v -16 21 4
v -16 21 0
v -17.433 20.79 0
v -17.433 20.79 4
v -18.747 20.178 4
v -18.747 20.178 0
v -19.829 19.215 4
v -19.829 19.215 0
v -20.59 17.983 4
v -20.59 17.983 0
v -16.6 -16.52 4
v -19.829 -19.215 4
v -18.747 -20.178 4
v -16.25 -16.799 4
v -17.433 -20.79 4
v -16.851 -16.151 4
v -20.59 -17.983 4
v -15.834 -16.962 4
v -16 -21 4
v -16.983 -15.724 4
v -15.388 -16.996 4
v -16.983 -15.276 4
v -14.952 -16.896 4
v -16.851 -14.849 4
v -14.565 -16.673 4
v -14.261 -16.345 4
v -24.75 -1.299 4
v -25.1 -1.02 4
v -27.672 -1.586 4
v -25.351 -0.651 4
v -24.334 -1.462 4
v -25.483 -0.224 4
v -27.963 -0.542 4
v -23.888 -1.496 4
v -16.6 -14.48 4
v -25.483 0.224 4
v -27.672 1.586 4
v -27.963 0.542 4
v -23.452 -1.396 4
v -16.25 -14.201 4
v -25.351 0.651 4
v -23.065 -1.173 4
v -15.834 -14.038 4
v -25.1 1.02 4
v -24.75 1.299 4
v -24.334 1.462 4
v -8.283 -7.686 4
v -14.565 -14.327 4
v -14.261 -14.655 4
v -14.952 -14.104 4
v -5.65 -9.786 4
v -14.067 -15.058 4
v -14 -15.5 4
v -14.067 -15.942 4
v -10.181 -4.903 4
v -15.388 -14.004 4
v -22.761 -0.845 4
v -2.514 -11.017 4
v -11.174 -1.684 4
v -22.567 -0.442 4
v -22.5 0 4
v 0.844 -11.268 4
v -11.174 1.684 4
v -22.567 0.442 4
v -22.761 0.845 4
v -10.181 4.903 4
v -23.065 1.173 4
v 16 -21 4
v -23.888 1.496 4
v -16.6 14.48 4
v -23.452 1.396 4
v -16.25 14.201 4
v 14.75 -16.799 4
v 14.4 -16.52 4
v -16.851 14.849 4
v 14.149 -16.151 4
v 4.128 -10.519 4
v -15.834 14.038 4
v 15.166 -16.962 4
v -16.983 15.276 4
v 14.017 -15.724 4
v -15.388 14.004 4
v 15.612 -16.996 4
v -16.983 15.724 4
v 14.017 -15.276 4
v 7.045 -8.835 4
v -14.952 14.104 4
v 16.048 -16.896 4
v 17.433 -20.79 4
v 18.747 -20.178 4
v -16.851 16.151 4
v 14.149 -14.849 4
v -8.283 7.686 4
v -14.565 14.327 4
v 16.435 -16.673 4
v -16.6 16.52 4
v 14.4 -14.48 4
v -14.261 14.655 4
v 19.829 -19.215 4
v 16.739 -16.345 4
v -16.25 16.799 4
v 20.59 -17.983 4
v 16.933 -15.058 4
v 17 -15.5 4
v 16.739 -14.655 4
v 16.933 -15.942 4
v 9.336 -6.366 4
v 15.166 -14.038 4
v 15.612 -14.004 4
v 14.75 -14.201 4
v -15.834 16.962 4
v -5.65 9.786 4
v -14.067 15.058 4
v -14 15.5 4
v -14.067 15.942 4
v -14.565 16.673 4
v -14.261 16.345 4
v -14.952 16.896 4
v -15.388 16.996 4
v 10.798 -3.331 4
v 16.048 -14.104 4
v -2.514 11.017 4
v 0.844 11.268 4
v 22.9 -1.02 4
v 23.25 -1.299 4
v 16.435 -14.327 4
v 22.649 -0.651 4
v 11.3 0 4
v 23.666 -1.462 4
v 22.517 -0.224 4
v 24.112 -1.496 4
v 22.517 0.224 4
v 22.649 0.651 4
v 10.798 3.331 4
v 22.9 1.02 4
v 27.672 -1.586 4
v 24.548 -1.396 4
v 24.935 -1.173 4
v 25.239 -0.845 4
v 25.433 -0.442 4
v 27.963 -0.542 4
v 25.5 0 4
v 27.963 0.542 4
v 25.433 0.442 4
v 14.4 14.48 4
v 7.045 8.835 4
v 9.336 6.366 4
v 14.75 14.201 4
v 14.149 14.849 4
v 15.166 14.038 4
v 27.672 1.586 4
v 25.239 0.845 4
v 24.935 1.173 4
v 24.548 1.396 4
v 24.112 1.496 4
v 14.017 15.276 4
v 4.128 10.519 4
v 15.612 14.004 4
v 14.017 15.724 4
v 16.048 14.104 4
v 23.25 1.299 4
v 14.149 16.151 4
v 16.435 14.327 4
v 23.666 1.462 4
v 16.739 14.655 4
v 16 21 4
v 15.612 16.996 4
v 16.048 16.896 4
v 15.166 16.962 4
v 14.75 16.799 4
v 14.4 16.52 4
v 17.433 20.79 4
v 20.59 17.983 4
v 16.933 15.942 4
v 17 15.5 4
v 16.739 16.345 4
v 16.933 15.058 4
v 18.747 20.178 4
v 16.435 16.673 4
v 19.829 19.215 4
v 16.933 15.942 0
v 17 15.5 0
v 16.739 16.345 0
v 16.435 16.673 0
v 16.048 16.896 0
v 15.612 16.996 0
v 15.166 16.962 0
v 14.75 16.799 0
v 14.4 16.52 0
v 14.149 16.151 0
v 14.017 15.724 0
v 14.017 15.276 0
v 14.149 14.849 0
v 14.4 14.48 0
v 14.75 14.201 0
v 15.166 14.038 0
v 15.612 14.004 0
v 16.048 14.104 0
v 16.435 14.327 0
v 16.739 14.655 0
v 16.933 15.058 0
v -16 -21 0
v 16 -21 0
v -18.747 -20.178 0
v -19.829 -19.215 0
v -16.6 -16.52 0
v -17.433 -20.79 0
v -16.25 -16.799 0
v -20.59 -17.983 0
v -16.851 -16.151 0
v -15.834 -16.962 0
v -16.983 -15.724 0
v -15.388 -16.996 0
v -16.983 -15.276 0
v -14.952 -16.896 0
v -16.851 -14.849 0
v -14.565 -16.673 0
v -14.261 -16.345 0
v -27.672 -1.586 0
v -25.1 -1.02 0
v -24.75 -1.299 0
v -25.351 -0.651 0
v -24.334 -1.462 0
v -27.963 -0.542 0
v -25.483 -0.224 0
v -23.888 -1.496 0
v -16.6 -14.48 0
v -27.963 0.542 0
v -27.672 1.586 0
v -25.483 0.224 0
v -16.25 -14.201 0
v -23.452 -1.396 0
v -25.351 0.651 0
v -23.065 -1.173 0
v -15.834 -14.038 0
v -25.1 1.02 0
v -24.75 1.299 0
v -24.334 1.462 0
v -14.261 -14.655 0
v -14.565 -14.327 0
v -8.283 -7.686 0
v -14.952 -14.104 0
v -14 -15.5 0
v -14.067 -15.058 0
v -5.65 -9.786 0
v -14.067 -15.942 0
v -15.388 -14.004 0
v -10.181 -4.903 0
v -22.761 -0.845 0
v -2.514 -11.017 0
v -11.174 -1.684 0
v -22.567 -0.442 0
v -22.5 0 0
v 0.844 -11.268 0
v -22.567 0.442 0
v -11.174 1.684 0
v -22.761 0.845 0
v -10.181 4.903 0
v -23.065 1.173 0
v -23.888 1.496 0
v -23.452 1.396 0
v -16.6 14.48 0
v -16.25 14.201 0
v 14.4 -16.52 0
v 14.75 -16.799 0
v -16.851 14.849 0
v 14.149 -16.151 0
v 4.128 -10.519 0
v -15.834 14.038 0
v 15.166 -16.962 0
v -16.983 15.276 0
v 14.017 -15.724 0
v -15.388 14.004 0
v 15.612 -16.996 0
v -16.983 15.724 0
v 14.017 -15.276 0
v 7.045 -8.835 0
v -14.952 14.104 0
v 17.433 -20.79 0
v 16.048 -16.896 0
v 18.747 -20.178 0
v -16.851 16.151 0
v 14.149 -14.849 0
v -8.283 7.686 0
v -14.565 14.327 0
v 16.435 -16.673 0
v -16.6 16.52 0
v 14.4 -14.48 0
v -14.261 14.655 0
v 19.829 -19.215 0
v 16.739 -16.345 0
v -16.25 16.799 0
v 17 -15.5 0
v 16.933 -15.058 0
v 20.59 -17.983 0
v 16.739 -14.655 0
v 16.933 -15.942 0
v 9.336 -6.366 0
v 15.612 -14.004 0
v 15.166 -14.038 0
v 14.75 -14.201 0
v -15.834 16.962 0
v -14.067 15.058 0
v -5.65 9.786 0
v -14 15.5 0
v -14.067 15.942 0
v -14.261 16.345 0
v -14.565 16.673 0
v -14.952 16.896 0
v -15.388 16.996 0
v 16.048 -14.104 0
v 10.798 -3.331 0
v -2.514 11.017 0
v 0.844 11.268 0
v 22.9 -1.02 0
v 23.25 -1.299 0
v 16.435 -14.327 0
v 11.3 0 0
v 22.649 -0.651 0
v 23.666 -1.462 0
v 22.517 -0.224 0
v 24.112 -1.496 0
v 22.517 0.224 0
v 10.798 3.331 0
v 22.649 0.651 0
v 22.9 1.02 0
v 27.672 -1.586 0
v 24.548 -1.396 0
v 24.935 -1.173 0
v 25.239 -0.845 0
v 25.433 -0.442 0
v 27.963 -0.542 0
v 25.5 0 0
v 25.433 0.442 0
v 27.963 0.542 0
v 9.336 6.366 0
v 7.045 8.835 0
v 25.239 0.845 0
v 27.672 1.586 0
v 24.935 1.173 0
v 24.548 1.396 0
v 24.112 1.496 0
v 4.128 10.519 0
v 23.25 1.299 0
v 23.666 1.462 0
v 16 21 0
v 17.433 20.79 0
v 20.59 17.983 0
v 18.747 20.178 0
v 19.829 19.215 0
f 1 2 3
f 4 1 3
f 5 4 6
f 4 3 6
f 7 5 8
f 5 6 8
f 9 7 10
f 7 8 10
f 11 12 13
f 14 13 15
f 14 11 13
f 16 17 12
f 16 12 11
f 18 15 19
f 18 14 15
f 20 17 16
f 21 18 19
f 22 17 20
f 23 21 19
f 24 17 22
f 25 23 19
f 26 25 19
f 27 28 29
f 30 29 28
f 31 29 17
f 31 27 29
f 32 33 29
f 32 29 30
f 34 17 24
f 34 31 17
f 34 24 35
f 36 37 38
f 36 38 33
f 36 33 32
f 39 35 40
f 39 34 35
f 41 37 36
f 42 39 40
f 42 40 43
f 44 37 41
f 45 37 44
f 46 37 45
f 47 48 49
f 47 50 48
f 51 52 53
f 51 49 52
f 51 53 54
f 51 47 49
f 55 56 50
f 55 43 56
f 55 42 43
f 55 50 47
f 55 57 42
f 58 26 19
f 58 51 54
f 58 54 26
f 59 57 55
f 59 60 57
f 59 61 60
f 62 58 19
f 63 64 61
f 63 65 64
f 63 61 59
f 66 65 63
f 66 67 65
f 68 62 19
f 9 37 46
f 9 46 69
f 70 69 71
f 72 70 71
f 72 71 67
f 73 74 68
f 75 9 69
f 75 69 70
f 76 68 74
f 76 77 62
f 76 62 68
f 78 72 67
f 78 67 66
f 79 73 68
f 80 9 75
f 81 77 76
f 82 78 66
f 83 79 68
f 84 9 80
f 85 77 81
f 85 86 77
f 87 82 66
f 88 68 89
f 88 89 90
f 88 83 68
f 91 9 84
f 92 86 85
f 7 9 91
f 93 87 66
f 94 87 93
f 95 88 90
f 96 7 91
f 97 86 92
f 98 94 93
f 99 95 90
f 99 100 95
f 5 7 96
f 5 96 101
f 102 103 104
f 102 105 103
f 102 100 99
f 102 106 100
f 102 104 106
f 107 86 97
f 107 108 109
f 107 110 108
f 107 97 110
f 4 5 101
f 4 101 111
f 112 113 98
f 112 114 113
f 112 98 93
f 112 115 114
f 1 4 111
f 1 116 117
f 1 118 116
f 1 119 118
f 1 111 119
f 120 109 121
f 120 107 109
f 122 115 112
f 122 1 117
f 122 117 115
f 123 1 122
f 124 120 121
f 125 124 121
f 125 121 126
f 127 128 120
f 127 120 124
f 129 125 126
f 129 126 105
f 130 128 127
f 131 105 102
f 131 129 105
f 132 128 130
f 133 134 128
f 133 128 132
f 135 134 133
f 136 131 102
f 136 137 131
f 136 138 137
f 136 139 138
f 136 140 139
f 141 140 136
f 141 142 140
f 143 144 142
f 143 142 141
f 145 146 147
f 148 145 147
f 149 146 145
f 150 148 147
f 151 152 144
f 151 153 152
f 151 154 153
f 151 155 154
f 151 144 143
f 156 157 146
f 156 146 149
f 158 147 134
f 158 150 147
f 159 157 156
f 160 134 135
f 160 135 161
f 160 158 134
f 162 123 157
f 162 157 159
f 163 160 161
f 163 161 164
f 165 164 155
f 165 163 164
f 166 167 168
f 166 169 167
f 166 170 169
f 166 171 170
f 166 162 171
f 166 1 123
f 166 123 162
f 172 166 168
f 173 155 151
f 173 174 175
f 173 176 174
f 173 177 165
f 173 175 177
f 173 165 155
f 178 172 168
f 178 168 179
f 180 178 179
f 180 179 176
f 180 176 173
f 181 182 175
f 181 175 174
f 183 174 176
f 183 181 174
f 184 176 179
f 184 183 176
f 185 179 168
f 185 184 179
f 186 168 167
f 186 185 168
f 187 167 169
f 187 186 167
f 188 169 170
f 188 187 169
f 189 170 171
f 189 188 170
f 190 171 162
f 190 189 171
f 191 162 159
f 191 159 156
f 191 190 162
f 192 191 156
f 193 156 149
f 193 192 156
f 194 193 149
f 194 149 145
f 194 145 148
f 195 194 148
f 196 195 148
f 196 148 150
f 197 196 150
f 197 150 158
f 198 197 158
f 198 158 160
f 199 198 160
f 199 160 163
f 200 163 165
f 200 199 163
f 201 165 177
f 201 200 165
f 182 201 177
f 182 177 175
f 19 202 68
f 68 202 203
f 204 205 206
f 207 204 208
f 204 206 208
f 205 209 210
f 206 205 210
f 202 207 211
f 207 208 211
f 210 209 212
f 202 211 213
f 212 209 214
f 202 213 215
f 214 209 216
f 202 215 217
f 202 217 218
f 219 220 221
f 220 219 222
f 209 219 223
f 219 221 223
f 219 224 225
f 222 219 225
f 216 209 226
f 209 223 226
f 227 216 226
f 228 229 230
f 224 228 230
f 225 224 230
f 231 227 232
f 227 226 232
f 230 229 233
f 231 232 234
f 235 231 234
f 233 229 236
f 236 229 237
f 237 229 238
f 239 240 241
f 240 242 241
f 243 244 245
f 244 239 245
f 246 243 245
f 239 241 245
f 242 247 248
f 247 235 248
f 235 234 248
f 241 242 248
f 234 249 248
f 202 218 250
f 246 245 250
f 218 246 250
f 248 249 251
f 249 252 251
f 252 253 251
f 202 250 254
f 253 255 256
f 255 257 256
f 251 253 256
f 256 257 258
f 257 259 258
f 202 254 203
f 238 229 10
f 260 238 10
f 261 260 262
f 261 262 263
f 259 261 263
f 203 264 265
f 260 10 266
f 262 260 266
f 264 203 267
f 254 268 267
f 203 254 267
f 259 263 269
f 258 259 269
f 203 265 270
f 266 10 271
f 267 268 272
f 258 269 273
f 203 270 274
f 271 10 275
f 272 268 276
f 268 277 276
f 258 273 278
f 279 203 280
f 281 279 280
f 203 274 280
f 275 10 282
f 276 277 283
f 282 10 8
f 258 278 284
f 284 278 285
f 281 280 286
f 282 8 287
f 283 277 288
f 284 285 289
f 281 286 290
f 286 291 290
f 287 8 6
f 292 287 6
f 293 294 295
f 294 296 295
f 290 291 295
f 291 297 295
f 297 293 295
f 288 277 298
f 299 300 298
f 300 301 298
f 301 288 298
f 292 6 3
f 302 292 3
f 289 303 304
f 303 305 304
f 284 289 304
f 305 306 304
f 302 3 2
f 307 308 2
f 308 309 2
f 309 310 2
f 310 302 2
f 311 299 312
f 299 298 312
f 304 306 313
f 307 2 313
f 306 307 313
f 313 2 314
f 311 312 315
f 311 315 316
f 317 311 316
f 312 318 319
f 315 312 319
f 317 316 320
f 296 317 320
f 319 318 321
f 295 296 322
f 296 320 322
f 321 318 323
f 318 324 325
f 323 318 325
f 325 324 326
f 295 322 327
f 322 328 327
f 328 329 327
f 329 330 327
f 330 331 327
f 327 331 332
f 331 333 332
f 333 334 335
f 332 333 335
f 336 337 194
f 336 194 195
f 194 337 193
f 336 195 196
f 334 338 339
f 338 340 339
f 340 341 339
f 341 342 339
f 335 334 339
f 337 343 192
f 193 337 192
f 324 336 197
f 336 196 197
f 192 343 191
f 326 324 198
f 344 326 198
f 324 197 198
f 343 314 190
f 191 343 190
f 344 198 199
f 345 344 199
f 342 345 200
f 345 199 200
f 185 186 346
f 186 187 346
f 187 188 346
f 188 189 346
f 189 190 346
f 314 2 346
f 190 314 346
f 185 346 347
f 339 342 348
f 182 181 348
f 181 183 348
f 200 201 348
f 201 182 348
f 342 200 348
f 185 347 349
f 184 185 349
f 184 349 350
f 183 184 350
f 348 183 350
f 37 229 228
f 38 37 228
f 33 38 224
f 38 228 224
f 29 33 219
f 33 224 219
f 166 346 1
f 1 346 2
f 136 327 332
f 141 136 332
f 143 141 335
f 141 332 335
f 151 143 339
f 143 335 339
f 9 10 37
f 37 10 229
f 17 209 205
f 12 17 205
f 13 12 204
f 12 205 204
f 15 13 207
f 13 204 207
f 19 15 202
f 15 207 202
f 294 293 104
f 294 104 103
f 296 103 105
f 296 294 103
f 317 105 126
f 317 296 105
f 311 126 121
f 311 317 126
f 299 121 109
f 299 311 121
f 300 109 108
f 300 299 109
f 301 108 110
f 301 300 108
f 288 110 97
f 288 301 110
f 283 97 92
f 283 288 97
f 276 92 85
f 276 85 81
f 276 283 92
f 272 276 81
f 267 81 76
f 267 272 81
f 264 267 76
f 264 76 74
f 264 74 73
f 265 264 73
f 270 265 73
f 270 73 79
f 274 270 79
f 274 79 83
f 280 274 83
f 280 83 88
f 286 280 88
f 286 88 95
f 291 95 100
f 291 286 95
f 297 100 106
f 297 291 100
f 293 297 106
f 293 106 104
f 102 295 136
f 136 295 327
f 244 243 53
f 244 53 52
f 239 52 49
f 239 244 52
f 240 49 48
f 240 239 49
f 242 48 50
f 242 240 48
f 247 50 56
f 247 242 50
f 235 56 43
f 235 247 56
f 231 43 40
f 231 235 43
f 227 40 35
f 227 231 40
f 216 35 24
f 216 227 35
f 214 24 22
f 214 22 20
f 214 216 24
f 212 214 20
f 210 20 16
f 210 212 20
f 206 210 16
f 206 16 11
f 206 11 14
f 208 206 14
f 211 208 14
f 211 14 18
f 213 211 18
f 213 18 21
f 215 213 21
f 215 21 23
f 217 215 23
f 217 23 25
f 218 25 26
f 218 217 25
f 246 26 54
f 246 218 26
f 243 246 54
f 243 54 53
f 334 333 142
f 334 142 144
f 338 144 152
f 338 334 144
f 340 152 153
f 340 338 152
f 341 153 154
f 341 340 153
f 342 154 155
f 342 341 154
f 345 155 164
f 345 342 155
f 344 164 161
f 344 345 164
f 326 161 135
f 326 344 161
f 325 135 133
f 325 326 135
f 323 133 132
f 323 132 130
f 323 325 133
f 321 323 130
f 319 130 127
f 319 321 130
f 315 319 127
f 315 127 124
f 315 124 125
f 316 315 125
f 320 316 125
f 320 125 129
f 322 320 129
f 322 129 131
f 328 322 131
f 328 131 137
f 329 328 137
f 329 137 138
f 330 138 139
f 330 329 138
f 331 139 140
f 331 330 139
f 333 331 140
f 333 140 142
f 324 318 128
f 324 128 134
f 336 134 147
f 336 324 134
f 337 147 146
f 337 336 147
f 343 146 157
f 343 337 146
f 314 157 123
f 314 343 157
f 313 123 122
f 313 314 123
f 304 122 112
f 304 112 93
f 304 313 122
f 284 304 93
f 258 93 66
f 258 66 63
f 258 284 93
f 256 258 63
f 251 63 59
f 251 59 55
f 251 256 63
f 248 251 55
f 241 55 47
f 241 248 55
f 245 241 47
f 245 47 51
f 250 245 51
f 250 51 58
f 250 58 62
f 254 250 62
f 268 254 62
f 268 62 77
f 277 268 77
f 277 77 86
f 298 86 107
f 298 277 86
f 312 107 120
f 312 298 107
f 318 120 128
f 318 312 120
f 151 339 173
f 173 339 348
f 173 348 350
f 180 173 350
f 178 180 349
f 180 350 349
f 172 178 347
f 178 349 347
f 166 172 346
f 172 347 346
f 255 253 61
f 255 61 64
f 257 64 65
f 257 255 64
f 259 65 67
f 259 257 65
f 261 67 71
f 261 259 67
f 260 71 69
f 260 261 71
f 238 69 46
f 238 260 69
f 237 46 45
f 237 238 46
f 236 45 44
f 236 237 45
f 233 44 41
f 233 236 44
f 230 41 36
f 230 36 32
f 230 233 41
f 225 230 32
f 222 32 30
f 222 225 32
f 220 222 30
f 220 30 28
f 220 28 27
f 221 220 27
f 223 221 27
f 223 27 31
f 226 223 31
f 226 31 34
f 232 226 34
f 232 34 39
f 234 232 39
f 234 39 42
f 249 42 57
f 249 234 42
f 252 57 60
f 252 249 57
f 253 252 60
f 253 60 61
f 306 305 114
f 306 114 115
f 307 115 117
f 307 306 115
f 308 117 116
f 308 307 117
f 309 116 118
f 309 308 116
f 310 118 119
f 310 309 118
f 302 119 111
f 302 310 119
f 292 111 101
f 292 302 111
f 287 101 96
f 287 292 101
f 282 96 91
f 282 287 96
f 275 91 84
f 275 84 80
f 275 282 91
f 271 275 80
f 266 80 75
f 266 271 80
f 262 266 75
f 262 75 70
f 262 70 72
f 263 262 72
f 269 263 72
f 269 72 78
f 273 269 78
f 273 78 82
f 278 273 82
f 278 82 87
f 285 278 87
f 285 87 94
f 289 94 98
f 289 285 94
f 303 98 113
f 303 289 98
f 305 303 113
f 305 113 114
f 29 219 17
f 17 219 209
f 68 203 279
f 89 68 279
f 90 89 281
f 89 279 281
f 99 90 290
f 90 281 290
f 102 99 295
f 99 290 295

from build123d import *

# Parameters (mm, degrees)
F0_R     = 1.5
F0_R_2   = 11.3
F1_DEPTH = 4


with BuildPart() as f1:
    # F0 (on Top) → F1 (new body)
    with BuildSketch(Plane.XY):
        with BuildLine():
            Line((-20.590143, 17.982571), (-27.672114, 1.586057))
            ThreePointArc((-27.672114, 1.586057), (-28, 0), (-27.672114, -1.586057))
            Line((-27.672114, -1.586057), (-20.590143, -17.982571))
            ThreePointArc((-20.590143, -17.982571), (-18.746556, -20.178089), (-16, -21))
            Line((-16, -21), (16, -21))
            ThreePointArc((16, -21), (18.746556, -20.178089), (20.590143, -17.982571))
            Line((20.590143, -17.982571), (27.672114, -1.586057))
            ThreePointArc((27.672114, -1.586057), (28, 0), (27.672114, 1.586057))
            Line((27.672114, 1.586057), (20.590143, 17.982571))
            ThreePointArc((20.590143, 17.982571), (18.746556, 20.178089), (16, 21))
            Line((16, 21), (-16, 21))
            ThreePointArc((-16, 21), (-18.746556, 20.178089), (-20.590143, 17.982571))
        make_face()
        with Locations((-15.5, -15.5)):
            Circle(F0_R, mode=Mode.SUBTRACT)
        with Locations((15.5, -15.5)):
            Circle(F0_R, mode=Mode.SUBTRACT)
        with Locations((-24, 0)):
            Circle(F0_R, mode=Mode.SUBTRACT)
        with Locations((-15.5, 15.5)):
            Circle(F0_R, mode=Mode.SUBTRACT)
        Circle(F0_R_2, mode=Mode.SUBTRACT)
        with Locations((24, 0)):
            Circle(F0_R, mode=Mode.SUBTRACT)
        with Locations((15.5, 15.5)):
            Circle(F0_R, mode=Mode.SUBTRACT)
    extrude(amount=F1_DEPTH)


solid = f1.part
